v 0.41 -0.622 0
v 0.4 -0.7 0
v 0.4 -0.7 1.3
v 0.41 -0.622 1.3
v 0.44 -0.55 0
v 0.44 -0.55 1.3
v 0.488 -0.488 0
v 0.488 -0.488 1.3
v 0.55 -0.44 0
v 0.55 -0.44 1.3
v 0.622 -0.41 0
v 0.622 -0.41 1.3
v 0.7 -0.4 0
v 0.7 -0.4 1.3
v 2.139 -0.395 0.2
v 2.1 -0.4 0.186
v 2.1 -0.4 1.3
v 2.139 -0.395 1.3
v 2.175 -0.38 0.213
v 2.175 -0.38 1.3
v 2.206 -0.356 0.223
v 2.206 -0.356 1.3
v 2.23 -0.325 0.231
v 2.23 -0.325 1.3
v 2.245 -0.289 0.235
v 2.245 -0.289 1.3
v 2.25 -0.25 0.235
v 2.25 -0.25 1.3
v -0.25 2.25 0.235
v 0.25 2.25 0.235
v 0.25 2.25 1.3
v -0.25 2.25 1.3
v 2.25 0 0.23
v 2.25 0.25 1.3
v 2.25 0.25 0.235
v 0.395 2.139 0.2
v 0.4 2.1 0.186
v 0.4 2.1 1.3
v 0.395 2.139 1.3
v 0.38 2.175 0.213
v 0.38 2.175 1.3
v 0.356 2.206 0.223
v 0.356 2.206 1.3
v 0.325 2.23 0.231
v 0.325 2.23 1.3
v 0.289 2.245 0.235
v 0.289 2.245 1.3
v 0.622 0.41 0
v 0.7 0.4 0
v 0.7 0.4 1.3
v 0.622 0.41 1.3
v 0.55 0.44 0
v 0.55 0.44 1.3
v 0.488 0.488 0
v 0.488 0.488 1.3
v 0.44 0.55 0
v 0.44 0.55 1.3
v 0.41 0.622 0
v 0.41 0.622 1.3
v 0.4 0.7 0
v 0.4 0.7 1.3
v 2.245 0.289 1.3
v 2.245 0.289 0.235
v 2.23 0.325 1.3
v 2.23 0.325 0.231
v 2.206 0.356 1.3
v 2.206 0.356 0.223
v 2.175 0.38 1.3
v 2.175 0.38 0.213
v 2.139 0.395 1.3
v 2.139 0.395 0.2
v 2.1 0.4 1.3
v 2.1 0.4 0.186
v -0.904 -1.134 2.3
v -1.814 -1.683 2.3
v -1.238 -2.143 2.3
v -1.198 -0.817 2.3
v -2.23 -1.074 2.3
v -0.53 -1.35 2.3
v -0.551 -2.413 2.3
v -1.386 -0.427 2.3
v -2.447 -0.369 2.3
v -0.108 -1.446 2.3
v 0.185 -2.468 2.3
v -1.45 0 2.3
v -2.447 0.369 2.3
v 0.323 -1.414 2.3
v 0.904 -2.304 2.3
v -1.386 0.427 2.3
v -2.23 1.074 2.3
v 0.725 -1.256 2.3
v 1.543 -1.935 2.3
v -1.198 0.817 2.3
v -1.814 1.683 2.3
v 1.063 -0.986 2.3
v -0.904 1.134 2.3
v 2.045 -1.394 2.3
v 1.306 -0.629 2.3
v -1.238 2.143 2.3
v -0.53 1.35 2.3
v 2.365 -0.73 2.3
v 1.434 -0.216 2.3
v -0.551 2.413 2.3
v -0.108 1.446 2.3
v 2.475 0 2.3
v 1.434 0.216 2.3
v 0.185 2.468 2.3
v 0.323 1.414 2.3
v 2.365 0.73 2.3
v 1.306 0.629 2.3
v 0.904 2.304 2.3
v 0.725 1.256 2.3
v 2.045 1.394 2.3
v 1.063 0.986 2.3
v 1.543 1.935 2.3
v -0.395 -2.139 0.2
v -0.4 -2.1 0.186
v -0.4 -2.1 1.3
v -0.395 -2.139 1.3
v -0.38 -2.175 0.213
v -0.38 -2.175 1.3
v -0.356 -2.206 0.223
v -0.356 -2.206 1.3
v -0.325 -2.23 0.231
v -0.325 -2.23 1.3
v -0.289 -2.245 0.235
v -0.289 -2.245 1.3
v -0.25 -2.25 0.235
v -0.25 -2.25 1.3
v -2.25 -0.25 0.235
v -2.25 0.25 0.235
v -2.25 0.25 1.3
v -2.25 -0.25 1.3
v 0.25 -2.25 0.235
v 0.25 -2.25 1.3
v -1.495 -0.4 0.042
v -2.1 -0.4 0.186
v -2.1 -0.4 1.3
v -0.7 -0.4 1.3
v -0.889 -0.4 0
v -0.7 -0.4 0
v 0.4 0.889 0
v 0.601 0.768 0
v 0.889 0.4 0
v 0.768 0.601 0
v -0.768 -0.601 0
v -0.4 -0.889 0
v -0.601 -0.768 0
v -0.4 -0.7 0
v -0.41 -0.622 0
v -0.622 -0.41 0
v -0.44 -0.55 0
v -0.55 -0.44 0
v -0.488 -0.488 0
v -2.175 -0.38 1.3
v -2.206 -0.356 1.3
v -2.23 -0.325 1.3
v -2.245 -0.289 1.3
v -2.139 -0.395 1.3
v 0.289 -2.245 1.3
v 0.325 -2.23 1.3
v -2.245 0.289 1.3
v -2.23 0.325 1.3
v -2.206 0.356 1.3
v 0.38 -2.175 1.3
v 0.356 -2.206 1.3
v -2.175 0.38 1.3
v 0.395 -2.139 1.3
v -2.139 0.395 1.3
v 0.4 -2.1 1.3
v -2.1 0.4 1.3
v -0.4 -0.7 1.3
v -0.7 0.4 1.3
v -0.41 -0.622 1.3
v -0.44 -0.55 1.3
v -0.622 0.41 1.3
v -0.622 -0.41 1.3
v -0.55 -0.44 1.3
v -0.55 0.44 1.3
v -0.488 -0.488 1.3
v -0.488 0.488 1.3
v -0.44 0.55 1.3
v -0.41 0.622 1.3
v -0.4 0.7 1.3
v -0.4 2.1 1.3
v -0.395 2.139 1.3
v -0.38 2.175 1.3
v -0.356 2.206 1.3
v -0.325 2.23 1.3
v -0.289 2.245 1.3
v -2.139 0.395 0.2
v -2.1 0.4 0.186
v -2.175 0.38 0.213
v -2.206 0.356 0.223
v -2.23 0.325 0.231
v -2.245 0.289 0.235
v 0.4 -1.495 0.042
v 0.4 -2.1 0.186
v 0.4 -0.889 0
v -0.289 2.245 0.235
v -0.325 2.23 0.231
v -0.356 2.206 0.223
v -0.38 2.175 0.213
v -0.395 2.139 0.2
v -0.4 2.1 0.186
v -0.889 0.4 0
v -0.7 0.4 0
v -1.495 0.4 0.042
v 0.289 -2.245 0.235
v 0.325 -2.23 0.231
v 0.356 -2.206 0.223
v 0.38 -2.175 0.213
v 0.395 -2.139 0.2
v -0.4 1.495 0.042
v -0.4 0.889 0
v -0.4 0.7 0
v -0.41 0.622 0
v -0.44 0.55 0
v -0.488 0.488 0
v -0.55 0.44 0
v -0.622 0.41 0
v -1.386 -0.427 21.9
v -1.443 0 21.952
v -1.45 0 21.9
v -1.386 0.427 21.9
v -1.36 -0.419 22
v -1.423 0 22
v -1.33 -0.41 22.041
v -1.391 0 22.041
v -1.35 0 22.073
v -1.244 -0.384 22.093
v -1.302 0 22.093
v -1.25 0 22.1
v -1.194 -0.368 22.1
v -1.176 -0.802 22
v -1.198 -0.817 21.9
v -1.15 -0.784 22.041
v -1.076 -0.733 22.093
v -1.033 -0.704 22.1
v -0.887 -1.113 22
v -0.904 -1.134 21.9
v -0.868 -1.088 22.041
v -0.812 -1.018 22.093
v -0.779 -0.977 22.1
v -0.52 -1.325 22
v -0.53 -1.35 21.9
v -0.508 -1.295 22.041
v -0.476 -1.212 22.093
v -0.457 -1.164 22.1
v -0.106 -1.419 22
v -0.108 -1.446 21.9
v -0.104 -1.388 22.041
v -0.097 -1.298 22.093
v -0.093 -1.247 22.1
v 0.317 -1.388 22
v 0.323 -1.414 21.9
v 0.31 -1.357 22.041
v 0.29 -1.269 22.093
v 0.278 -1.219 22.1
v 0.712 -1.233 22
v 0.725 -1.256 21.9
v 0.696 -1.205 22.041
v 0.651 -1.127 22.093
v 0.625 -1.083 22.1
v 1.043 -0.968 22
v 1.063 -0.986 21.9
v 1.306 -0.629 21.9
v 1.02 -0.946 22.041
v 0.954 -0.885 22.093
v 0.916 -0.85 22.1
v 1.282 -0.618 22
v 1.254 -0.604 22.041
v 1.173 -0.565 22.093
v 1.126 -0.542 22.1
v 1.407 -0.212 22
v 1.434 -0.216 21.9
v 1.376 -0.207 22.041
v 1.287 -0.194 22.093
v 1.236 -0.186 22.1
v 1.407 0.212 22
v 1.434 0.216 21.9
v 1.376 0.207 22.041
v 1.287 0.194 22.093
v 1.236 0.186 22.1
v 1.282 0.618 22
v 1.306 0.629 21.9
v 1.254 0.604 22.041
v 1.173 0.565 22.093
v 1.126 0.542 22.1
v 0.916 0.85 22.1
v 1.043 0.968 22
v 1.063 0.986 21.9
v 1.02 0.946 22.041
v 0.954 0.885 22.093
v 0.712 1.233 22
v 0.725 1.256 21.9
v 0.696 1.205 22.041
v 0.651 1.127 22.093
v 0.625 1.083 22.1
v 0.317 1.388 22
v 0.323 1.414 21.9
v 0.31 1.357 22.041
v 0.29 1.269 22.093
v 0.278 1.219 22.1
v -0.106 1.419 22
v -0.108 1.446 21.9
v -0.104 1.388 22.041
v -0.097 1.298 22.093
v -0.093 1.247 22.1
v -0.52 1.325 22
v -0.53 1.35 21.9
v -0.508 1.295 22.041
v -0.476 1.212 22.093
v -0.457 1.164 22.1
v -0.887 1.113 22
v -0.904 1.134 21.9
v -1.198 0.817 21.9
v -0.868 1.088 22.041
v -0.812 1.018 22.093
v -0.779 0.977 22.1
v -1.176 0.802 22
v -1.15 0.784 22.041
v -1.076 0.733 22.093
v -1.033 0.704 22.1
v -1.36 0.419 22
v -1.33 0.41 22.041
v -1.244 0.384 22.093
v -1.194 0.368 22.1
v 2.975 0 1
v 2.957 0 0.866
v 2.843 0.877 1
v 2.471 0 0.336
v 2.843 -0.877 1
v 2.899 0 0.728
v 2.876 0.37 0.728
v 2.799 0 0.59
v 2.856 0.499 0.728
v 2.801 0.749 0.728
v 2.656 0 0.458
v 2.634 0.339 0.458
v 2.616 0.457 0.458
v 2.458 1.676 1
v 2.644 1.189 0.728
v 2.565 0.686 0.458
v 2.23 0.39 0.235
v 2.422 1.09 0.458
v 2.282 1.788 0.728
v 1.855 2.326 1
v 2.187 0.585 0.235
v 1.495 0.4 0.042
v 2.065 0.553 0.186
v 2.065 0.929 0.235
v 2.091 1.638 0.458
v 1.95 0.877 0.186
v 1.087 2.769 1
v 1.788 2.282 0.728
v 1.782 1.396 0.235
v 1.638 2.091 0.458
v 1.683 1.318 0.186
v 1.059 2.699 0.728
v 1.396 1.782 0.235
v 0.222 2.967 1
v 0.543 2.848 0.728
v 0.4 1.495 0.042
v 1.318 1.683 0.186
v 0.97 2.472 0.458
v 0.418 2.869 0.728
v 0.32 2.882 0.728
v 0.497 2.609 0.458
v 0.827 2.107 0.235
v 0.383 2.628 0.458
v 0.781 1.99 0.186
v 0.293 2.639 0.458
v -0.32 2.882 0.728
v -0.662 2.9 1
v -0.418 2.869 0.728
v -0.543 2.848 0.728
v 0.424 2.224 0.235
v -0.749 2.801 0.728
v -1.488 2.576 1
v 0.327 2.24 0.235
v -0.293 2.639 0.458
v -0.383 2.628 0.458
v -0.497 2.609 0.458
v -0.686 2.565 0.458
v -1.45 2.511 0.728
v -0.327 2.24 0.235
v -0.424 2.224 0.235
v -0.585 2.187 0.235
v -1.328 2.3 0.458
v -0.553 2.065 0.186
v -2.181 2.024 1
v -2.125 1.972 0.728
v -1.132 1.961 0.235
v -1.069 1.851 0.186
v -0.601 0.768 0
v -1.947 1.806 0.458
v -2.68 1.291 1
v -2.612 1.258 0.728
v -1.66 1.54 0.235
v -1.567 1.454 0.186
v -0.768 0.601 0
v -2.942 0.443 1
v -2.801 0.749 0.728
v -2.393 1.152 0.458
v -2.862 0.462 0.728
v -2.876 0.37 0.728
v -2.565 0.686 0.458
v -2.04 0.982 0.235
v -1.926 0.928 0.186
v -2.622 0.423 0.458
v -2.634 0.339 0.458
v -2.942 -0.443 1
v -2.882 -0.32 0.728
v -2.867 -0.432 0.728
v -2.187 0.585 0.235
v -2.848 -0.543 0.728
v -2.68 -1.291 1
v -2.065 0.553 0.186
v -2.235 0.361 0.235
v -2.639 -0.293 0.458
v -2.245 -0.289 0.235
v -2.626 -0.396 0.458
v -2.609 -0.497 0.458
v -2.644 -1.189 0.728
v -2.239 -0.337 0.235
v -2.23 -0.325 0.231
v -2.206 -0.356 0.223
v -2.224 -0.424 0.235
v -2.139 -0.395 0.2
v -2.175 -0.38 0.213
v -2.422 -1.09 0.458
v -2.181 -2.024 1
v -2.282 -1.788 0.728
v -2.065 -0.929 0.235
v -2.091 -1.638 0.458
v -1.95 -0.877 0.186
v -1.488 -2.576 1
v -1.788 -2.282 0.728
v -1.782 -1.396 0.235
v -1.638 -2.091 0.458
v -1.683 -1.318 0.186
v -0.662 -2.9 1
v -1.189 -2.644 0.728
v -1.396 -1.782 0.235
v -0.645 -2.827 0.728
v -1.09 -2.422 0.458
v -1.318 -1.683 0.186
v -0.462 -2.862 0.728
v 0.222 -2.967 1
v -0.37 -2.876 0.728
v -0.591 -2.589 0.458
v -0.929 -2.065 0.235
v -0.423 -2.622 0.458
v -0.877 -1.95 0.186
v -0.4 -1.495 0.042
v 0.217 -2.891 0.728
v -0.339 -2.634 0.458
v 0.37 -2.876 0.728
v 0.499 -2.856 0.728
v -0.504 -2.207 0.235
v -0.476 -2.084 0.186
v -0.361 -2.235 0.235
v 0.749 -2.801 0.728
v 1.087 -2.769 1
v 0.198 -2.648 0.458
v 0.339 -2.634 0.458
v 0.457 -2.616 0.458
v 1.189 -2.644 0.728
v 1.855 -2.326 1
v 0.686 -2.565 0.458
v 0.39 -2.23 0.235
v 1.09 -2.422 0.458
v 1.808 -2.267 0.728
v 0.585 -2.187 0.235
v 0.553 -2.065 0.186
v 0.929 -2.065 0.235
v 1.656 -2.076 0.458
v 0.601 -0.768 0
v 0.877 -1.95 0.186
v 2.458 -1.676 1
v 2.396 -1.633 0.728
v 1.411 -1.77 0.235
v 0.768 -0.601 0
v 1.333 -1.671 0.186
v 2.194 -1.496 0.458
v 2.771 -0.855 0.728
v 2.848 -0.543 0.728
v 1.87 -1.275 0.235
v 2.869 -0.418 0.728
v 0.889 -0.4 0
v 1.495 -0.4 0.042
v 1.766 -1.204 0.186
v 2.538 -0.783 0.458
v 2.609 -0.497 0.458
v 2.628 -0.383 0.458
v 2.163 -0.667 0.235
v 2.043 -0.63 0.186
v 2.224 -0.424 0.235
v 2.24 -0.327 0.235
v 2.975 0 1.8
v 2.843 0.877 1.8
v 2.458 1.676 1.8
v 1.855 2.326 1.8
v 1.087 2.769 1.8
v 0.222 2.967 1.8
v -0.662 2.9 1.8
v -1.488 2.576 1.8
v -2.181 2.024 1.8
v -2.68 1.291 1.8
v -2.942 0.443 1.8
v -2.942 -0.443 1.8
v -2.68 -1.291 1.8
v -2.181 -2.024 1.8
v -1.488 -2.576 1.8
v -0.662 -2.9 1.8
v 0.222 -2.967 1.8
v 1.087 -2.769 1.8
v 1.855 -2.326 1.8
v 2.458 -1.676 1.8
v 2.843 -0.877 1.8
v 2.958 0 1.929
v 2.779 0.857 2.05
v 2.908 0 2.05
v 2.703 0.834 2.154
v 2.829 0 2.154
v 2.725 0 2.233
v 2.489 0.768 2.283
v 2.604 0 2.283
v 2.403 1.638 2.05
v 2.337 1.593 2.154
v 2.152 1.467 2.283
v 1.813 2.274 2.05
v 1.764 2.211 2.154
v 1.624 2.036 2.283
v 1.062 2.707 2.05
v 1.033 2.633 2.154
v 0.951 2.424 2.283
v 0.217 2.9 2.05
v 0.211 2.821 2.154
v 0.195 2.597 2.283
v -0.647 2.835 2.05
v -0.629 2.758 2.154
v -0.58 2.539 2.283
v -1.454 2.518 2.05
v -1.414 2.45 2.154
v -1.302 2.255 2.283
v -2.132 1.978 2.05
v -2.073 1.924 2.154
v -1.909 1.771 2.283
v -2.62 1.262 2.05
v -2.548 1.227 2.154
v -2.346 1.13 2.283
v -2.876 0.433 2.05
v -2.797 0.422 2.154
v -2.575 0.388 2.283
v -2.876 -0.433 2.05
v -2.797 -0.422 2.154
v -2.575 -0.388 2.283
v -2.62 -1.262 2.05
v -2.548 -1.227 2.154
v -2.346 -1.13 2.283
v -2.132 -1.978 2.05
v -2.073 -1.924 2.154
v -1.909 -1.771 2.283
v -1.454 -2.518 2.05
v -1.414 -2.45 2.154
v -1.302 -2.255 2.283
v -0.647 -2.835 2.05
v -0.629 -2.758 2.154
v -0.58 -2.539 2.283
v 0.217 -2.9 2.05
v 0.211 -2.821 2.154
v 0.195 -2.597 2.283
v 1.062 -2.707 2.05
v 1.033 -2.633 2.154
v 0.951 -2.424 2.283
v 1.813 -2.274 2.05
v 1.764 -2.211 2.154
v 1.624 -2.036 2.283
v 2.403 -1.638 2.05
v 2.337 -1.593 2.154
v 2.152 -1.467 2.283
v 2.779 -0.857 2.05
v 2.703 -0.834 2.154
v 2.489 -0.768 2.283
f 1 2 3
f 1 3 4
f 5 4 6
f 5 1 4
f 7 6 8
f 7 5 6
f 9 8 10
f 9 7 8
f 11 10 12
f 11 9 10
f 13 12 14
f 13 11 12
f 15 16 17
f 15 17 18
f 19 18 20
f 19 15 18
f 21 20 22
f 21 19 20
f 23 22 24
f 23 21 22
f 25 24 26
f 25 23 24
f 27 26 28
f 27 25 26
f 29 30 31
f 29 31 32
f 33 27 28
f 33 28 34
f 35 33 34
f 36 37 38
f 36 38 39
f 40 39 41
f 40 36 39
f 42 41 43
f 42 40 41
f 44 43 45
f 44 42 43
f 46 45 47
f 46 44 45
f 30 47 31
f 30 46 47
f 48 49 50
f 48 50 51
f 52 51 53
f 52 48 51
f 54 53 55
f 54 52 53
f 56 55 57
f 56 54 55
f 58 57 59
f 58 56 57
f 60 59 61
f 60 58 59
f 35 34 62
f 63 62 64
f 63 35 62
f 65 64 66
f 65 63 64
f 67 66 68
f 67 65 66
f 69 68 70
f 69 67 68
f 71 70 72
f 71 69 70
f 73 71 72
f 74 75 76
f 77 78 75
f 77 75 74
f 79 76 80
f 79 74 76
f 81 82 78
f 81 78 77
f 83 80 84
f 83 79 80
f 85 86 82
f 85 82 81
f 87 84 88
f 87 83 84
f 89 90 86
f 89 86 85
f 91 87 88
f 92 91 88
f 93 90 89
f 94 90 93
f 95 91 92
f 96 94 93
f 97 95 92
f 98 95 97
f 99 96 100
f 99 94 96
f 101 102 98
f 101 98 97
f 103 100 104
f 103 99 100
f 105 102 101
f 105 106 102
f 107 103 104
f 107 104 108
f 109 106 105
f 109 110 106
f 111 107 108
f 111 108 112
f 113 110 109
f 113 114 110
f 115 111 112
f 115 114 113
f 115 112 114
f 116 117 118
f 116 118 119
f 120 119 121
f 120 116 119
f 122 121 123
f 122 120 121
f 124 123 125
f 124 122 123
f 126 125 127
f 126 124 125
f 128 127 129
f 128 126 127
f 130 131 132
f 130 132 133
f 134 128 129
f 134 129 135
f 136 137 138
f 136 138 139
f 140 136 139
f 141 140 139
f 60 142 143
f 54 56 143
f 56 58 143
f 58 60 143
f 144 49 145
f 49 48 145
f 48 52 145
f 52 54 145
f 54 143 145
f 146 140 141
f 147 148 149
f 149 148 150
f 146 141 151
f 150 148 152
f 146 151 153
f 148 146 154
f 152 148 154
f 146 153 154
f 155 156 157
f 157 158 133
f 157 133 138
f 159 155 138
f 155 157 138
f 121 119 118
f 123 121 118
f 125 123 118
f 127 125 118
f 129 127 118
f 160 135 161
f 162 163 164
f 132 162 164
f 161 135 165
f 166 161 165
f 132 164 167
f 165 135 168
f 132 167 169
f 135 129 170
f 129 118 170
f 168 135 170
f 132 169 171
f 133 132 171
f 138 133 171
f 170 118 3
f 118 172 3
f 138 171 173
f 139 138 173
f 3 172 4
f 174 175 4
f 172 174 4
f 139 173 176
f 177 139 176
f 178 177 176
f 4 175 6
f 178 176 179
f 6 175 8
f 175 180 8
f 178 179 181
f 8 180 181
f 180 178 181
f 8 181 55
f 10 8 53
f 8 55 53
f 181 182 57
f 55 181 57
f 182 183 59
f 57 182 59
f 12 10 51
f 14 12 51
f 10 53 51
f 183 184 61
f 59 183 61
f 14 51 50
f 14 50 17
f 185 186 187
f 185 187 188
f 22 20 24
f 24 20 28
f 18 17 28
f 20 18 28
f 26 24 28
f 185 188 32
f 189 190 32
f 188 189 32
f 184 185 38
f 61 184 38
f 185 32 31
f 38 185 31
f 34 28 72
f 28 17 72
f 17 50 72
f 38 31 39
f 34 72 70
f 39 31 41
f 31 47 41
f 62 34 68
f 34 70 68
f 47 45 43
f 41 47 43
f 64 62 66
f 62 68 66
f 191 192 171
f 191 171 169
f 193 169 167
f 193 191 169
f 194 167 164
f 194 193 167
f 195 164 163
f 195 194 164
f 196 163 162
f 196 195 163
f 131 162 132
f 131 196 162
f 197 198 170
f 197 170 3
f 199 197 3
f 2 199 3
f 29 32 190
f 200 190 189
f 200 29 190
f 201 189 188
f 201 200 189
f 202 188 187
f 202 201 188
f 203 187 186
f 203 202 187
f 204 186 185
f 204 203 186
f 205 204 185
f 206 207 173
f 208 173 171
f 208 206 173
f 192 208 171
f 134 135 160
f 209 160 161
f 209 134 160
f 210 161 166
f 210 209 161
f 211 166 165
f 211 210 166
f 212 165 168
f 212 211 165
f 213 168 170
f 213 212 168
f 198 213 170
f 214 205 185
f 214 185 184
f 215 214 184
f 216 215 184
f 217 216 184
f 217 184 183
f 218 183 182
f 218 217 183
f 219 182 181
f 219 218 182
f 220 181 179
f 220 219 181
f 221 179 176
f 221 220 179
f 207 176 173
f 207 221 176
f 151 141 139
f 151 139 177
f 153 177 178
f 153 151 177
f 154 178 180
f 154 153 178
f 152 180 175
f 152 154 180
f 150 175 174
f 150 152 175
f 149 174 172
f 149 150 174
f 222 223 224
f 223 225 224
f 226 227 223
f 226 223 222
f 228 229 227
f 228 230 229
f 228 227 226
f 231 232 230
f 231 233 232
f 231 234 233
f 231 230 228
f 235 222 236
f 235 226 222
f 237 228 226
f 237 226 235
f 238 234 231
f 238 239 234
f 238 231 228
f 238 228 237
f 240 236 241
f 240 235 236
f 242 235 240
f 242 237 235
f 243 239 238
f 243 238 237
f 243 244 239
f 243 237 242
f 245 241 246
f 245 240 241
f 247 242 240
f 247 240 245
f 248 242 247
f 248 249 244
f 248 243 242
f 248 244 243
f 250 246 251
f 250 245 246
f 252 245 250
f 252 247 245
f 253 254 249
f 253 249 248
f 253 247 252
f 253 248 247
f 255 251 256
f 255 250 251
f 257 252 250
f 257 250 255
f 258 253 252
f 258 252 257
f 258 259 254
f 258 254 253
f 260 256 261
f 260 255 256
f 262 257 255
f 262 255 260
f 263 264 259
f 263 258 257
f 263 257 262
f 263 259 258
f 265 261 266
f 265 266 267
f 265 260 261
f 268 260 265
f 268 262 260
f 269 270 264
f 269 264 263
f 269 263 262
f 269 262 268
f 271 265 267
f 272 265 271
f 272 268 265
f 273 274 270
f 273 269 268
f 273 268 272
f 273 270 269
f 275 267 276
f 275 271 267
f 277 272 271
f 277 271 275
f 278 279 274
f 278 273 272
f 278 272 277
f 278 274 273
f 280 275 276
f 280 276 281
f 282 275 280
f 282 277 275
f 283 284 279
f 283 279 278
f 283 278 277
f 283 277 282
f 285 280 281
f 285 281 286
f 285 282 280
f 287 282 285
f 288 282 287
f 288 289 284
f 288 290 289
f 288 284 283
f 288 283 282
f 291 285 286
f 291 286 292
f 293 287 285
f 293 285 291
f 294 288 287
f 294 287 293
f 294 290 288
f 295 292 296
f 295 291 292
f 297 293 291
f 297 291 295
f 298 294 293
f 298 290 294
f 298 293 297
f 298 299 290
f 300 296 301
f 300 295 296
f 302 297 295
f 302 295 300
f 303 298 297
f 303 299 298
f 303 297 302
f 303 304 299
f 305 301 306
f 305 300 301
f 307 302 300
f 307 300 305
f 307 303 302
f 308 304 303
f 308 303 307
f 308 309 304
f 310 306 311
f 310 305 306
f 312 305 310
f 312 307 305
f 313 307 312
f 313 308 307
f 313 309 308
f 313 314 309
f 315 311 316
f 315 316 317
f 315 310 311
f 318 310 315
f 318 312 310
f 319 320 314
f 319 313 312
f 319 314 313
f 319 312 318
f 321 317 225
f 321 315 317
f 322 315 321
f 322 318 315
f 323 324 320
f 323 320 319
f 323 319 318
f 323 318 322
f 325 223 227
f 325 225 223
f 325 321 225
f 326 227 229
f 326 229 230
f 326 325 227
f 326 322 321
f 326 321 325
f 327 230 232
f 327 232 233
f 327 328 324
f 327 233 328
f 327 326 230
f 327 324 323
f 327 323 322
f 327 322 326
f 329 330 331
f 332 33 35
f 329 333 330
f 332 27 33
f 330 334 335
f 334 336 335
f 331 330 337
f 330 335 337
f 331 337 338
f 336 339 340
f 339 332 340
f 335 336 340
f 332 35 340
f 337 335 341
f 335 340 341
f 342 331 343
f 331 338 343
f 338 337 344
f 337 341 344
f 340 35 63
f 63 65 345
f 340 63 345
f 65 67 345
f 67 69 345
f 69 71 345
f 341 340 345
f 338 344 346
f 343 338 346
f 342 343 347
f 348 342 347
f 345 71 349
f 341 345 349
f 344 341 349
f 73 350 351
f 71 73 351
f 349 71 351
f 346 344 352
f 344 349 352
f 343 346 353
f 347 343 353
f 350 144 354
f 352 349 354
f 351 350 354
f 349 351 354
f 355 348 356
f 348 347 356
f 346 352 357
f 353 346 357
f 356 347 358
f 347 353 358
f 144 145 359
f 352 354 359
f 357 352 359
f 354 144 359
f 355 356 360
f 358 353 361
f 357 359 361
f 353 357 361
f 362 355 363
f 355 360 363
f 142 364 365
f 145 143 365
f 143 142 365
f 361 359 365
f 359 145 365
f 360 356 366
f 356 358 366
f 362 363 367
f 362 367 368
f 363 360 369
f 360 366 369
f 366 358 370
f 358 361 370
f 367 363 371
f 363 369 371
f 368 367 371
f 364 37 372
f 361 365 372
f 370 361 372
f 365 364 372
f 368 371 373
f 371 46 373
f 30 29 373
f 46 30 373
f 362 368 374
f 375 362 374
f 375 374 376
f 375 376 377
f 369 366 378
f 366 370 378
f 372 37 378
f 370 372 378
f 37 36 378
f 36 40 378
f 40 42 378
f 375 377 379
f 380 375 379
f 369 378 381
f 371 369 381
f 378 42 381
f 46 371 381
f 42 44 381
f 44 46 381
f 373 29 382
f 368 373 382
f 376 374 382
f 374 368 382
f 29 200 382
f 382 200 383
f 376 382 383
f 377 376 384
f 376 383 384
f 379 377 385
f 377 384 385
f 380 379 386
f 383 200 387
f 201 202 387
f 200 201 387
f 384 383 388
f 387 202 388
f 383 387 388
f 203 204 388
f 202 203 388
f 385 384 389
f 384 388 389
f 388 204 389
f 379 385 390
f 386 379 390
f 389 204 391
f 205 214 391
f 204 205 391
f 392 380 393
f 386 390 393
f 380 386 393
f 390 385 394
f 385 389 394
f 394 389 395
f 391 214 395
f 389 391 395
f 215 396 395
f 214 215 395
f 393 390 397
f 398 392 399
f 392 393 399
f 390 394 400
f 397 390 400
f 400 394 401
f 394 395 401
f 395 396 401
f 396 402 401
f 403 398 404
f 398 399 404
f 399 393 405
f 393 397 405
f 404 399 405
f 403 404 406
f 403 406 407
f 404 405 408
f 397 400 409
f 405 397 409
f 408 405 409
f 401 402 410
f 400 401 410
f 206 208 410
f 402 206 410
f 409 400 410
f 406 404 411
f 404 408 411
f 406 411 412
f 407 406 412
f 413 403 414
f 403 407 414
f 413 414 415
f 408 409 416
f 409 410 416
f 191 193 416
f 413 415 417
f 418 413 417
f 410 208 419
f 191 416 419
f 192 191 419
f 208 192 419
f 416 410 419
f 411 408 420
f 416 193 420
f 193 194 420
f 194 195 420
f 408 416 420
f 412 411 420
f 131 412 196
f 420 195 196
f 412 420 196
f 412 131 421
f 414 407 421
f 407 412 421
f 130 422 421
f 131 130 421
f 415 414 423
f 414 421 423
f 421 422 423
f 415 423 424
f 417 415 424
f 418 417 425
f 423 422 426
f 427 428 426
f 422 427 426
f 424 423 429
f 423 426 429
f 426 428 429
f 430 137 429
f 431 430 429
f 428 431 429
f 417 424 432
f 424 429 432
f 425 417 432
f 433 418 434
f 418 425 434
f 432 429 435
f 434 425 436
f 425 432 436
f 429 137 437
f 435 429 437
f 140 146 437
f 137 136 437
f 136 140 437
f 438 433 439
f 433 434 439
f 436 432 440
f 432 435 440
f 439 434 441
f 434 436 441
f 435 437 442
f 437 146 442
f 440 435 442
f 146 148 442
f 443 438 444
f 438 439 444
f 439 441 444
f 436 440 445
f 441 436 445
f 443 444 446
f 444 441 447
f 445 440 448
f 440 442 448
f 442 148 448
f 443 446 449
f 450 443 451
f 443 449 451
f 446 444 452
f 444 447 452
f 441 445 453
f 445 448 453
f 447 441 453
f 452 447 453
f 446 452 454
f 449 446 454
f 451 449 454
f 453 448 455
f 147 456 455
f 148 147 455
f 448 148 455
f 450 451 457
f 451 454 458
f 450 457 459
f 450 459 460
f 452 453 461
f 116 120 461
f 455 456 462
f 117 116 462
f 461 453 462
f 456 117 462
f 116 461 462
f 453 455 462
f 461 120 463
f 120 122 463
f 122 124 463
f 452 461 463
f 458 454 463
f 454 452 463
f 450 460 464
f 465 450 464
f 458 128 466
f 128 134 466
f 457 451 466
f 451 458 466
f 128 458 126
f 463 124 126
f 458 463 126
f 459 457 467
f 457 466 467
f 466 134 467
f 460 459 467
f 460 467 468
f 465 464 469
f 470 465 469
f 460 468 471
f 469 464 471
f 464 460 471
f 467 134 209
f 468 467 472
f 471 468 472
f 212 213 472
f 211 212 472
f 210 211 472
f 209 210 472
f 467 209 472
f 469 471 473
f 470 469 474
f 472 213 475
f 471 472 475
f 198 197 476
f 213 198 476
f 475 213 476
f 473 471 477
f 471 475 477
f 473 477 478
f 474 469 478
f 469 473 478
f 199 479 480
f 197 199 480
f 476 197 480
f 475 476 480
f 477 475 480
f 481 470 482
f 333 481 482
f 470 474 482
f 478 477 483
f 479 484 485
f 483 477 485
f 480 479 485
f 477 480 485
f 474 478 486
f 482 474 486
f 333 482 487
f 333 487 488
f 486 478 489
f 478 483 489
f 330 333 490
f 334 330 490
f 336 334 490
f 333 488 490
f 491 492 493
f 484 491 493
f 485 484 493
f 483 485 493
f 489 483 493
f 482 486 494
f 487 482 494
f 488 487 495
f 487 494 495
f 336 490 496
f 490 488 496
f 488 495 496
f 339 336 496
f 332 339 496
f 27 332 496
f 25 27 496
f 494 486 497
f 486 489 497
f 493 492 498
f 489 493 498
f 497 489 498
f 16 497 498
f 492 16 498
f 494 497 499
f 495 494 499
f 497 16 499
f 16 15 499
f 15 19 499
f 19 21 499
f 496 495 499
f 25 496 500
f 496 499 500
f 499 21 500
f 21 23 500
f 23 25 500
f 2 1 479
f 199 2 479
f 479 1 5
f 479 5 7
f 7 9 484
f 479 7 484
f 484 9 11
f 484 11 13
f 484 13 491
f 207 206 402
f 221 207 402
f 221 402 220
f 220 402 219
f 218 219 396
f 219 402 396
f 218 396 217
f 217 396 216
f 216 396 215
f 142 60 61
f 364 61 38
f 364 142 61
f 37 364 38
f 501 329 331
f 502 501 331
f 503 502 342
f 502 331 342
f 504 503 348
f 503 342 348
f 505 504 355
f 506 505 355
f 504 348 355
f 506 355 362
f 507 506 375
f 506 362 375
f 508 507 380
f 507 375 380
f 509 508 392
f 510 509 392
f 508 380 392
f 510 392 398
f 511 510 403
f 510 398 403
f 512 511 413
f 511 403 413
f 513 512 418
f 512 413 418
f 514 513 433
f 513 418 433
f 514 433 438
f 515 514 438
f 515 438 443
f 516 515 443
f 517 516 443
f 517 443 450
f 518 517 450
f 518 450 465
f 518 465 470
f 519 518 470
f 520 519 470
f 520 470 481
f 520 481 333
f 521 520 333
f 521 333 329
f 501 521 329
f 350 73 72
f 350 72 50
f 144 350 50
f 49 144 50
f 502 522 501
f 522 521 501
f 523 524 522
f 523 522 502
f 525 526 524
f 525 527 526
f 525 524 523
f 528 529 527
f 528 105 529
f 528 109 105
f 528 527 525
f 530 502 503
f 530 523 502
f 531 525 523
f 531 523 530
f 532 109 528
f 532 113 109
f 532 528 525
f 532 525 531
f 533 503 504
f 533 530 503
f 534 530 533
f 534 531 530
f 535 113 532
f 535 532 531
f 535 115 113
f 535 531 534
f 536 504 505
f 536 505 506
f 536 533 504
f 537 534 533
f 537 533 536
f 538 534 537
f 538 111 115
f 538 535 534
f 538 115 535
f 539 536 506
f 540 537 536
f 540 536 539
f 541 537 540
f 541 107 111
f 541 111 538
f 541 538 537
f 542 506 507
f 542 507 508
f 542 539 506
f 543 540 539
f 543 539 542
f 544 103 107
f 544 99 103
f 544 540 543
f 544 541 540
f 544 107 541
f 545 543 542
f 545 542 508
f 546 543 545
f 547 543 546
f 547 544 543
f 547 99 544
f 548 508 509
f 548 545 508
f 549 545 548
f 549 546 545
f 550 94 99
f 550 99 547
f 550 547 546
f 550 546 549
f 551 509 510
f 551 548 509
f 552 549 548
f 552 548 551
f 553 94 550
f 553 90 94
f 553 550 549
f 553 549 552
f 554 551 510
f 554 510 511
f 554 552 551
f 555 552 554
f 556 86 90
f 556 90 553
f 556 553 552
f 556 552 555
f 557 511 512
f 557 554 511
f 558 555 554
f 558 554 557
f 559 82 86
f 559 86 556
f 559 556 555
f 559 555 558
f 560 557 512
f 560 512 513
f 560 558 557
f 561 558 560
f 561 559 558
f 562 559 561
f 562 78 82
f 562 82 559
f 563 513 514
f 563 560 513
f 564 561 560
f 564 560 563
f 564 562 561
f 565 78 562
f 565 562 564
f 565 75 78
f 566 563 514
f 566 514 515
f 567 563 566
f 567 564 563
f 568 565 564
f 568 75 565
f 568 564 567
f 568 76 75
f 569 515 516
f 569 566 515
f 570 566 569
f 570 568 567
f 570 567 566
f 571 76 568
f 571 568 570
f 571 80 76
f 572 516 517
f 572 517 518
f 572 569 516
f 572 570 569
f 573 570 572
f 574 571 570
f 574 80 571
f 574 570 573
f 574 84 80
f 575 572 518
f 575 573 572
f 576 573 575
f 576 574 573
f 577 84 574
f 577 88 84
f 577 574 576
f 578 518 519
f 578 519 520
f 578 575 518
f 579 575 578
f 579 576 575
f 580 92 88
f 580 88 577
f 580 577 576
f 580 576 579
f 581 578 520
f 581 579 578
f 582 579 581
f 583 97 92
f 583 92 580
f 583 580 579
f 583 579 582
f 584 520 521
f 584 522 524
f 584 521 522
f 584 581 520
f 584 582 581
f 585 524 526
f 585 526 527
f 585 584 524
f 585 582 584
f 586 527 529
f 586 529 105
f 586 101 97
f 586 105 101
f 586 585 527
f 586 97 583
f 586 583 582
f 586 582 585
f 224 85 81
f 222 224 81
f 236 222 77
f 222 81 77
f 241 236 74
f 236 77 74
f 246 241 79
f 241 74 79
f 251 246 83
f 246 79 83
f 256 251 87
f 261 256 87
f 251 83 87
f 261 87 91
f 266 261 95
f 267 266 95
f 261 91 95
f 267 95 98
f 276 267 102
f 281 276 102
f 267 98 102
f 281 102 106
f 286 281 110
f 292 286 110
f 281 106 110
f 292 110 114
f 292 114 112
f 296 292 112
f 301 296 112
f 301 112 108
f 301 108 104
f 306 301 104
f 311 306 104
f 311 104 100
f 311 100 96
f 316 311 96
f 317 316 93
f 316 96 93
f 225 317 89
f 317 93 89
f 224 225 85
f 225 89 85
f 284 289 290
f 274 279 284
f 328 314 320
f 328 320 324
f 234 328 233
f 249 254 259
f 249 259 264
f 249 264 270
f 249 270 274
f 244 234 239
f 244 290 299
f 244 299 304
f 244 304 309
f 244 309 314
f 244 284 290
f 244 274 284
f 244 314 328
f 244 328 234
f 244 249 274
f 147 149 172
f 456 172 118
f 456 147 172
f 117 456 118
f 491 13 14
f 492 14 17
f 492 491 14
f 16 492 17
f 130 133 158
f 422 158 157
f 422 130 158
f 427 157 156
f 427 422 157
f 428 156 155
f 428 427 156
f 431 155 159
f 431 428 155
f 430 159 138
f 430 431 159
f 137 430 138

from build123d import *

# Parameters (mm, degrees)
ESBO_O1_R                = 2.975
RESSALTO_EXTRUS_O1_DEPTH = 2.3
FILETE1_SIZE             = 1
FILETE1_SIZE_2           = 2
FILETE2_R                = 0.5
CORTE_EXTRUS_O1_DEPTH    = 1.3
ESBO_O3_R                = 1.45
RESSALTO_EXTRUS_O2_DEPTH = 19.8
FILETE3_R                = 0.2


with BuildPart() as part:
    # Esboço1 → Ressalto-extrusão1 (new body)
    with BuildSketch(Plane.XY):
        Circle(ESBO_O1_R)
    extrude(amount=RESSALTO_EXTRUS_O1_DEPTH)

    # Filete1
    # an asymmetric fillet: 2, 1 mm, written as the material it takes off along each edge
    with BuildSketch(Plane(origin=(0, 0, 0), x_dir=(1, 0, 0), z_dir=(0, -1, 0))) as filete1_piece_1:
        with BuildLine():
            Bezier((2.975, FILETE1_SIZE), (2.975, 0), (2.975 - FILETE1_SIZE_2, 0), weights=[1, 0.707106781, 1])
            Line((2.975 - FILETE1_SIZE_2, 0), (2.975, 0))
            Line((2.975, 0), (2.975, FILETE1_SIZE))
        make_face()
    revolve(axis=Axis((0, 0, 0), (0, 0, 1)), mode=Mode.SUBTRACT)

    # Filete2
    filete2_edges = [part.edges().sort_by_distance(p)[0] for p in [
        (-2.975, 0, 2.3),
    ]]
    fillet(filete2_edges, radius=FILETE2_R)

    # Esboço2 → Corte-extrusão1 (cut)
    with BuildSketch(Plane(origin=(0, 0, 0), x_dir=(-1, 0, 0), z_dir=(0, 0, -1))):
        with BuildLine():
            Line((0.25, -2.25), (-0.25, -2.25))
            ThreePointArc((-0.25, -2.25), (-0.356066017, -2.206066017), (-0.4, -2.1))
            Line((-0.4, -2.1), (-0.4, -0.7))
            ThreePointArc((-0.4, -0.7), (-0.487867966, -0.487867966), (-0.7, -0.4))
            Line((-0.7, -0.4), (-2.1, -0.4))
            ThreePointArc((-2.1, -0.4), (-2.206066017, -0.356066017), (-2.25, -0.25))
            Line((-2.25, -0.25), (-2.25, 0.25))
            ThreePointArc((-2.25, 0.25), (-2.206066017, 0.356066017), (-2.1, 0.4))
            Line((-2.1, 0.4), (-0.7, 0.4))
            ThreePointArc((-0.7, 0.4), (-0.487867966, 0.487867966), (-0.4, 0.7))
            Line((-0.4, 0.7), (-0.4, 2.1))
            ThreePointArc((-0.4, 2.1), (-0.356066017, 2.206066017), (-0.25, 2.25))
            Line((-0.25, 2.25), (0.25, 2.25))
            ThreePointArc((0.25, 2.25), (0.356066017, 2.206066017), (0.4, 2.1))
            Line((0.4, 2.1), (0.4, 0.7))
            ThreePointArc((0.4, 0.7), (0.487867966, 0.487867966), (0.7, 0.4))
            Line((0.7, 0.4), (2.1, 0.4))
            ThreePointArc((2.1, 0.4), (2.206066017, 0.356066017), (2.25, 0.25))
            Line((2.25, 0.25), (2.25, -0.25))
            ThreePointArc((2.25, -0.25), (2.206066017, -0.356066017), (2.1, -0.4))
            Line((2.1, -0.4), (0.7, -0.4))
            ThreePointArc((0.7, -0.4), (0.487867966, -0.487867966), (0.4, -0.7))
            Line((0.4, -0.7), (0.4, -2.1))
            ThreePointArc((0.4, -2.1), (0.356066017, -2.206066017), (0.25, -2.25))
        make_face()
    extrude(amount=-CORTE_EXTRUS_O1_DEPTH, mode=Mode.SUBTRACT)

    # Esboço3 → Ressalto-extrusão2 (add)
    with BuildSketch(Plane.XY.offset(2.3)):
        with Locations(Location((0, 0, 0), (0, 0, 180))):
            Circle(ESBO_O3_R)
    extrude(amount=RESSALTO_EXTRUS_O2_DEPTH)

    # Filete3
    filete3_edges = [part.edges().sort_by_distance(p)[0] for p in [
        (1.45, 0, 22.1),
    ]]
    fillet(filete3_edges, radius=FILETE3_R)


solid = part.part
